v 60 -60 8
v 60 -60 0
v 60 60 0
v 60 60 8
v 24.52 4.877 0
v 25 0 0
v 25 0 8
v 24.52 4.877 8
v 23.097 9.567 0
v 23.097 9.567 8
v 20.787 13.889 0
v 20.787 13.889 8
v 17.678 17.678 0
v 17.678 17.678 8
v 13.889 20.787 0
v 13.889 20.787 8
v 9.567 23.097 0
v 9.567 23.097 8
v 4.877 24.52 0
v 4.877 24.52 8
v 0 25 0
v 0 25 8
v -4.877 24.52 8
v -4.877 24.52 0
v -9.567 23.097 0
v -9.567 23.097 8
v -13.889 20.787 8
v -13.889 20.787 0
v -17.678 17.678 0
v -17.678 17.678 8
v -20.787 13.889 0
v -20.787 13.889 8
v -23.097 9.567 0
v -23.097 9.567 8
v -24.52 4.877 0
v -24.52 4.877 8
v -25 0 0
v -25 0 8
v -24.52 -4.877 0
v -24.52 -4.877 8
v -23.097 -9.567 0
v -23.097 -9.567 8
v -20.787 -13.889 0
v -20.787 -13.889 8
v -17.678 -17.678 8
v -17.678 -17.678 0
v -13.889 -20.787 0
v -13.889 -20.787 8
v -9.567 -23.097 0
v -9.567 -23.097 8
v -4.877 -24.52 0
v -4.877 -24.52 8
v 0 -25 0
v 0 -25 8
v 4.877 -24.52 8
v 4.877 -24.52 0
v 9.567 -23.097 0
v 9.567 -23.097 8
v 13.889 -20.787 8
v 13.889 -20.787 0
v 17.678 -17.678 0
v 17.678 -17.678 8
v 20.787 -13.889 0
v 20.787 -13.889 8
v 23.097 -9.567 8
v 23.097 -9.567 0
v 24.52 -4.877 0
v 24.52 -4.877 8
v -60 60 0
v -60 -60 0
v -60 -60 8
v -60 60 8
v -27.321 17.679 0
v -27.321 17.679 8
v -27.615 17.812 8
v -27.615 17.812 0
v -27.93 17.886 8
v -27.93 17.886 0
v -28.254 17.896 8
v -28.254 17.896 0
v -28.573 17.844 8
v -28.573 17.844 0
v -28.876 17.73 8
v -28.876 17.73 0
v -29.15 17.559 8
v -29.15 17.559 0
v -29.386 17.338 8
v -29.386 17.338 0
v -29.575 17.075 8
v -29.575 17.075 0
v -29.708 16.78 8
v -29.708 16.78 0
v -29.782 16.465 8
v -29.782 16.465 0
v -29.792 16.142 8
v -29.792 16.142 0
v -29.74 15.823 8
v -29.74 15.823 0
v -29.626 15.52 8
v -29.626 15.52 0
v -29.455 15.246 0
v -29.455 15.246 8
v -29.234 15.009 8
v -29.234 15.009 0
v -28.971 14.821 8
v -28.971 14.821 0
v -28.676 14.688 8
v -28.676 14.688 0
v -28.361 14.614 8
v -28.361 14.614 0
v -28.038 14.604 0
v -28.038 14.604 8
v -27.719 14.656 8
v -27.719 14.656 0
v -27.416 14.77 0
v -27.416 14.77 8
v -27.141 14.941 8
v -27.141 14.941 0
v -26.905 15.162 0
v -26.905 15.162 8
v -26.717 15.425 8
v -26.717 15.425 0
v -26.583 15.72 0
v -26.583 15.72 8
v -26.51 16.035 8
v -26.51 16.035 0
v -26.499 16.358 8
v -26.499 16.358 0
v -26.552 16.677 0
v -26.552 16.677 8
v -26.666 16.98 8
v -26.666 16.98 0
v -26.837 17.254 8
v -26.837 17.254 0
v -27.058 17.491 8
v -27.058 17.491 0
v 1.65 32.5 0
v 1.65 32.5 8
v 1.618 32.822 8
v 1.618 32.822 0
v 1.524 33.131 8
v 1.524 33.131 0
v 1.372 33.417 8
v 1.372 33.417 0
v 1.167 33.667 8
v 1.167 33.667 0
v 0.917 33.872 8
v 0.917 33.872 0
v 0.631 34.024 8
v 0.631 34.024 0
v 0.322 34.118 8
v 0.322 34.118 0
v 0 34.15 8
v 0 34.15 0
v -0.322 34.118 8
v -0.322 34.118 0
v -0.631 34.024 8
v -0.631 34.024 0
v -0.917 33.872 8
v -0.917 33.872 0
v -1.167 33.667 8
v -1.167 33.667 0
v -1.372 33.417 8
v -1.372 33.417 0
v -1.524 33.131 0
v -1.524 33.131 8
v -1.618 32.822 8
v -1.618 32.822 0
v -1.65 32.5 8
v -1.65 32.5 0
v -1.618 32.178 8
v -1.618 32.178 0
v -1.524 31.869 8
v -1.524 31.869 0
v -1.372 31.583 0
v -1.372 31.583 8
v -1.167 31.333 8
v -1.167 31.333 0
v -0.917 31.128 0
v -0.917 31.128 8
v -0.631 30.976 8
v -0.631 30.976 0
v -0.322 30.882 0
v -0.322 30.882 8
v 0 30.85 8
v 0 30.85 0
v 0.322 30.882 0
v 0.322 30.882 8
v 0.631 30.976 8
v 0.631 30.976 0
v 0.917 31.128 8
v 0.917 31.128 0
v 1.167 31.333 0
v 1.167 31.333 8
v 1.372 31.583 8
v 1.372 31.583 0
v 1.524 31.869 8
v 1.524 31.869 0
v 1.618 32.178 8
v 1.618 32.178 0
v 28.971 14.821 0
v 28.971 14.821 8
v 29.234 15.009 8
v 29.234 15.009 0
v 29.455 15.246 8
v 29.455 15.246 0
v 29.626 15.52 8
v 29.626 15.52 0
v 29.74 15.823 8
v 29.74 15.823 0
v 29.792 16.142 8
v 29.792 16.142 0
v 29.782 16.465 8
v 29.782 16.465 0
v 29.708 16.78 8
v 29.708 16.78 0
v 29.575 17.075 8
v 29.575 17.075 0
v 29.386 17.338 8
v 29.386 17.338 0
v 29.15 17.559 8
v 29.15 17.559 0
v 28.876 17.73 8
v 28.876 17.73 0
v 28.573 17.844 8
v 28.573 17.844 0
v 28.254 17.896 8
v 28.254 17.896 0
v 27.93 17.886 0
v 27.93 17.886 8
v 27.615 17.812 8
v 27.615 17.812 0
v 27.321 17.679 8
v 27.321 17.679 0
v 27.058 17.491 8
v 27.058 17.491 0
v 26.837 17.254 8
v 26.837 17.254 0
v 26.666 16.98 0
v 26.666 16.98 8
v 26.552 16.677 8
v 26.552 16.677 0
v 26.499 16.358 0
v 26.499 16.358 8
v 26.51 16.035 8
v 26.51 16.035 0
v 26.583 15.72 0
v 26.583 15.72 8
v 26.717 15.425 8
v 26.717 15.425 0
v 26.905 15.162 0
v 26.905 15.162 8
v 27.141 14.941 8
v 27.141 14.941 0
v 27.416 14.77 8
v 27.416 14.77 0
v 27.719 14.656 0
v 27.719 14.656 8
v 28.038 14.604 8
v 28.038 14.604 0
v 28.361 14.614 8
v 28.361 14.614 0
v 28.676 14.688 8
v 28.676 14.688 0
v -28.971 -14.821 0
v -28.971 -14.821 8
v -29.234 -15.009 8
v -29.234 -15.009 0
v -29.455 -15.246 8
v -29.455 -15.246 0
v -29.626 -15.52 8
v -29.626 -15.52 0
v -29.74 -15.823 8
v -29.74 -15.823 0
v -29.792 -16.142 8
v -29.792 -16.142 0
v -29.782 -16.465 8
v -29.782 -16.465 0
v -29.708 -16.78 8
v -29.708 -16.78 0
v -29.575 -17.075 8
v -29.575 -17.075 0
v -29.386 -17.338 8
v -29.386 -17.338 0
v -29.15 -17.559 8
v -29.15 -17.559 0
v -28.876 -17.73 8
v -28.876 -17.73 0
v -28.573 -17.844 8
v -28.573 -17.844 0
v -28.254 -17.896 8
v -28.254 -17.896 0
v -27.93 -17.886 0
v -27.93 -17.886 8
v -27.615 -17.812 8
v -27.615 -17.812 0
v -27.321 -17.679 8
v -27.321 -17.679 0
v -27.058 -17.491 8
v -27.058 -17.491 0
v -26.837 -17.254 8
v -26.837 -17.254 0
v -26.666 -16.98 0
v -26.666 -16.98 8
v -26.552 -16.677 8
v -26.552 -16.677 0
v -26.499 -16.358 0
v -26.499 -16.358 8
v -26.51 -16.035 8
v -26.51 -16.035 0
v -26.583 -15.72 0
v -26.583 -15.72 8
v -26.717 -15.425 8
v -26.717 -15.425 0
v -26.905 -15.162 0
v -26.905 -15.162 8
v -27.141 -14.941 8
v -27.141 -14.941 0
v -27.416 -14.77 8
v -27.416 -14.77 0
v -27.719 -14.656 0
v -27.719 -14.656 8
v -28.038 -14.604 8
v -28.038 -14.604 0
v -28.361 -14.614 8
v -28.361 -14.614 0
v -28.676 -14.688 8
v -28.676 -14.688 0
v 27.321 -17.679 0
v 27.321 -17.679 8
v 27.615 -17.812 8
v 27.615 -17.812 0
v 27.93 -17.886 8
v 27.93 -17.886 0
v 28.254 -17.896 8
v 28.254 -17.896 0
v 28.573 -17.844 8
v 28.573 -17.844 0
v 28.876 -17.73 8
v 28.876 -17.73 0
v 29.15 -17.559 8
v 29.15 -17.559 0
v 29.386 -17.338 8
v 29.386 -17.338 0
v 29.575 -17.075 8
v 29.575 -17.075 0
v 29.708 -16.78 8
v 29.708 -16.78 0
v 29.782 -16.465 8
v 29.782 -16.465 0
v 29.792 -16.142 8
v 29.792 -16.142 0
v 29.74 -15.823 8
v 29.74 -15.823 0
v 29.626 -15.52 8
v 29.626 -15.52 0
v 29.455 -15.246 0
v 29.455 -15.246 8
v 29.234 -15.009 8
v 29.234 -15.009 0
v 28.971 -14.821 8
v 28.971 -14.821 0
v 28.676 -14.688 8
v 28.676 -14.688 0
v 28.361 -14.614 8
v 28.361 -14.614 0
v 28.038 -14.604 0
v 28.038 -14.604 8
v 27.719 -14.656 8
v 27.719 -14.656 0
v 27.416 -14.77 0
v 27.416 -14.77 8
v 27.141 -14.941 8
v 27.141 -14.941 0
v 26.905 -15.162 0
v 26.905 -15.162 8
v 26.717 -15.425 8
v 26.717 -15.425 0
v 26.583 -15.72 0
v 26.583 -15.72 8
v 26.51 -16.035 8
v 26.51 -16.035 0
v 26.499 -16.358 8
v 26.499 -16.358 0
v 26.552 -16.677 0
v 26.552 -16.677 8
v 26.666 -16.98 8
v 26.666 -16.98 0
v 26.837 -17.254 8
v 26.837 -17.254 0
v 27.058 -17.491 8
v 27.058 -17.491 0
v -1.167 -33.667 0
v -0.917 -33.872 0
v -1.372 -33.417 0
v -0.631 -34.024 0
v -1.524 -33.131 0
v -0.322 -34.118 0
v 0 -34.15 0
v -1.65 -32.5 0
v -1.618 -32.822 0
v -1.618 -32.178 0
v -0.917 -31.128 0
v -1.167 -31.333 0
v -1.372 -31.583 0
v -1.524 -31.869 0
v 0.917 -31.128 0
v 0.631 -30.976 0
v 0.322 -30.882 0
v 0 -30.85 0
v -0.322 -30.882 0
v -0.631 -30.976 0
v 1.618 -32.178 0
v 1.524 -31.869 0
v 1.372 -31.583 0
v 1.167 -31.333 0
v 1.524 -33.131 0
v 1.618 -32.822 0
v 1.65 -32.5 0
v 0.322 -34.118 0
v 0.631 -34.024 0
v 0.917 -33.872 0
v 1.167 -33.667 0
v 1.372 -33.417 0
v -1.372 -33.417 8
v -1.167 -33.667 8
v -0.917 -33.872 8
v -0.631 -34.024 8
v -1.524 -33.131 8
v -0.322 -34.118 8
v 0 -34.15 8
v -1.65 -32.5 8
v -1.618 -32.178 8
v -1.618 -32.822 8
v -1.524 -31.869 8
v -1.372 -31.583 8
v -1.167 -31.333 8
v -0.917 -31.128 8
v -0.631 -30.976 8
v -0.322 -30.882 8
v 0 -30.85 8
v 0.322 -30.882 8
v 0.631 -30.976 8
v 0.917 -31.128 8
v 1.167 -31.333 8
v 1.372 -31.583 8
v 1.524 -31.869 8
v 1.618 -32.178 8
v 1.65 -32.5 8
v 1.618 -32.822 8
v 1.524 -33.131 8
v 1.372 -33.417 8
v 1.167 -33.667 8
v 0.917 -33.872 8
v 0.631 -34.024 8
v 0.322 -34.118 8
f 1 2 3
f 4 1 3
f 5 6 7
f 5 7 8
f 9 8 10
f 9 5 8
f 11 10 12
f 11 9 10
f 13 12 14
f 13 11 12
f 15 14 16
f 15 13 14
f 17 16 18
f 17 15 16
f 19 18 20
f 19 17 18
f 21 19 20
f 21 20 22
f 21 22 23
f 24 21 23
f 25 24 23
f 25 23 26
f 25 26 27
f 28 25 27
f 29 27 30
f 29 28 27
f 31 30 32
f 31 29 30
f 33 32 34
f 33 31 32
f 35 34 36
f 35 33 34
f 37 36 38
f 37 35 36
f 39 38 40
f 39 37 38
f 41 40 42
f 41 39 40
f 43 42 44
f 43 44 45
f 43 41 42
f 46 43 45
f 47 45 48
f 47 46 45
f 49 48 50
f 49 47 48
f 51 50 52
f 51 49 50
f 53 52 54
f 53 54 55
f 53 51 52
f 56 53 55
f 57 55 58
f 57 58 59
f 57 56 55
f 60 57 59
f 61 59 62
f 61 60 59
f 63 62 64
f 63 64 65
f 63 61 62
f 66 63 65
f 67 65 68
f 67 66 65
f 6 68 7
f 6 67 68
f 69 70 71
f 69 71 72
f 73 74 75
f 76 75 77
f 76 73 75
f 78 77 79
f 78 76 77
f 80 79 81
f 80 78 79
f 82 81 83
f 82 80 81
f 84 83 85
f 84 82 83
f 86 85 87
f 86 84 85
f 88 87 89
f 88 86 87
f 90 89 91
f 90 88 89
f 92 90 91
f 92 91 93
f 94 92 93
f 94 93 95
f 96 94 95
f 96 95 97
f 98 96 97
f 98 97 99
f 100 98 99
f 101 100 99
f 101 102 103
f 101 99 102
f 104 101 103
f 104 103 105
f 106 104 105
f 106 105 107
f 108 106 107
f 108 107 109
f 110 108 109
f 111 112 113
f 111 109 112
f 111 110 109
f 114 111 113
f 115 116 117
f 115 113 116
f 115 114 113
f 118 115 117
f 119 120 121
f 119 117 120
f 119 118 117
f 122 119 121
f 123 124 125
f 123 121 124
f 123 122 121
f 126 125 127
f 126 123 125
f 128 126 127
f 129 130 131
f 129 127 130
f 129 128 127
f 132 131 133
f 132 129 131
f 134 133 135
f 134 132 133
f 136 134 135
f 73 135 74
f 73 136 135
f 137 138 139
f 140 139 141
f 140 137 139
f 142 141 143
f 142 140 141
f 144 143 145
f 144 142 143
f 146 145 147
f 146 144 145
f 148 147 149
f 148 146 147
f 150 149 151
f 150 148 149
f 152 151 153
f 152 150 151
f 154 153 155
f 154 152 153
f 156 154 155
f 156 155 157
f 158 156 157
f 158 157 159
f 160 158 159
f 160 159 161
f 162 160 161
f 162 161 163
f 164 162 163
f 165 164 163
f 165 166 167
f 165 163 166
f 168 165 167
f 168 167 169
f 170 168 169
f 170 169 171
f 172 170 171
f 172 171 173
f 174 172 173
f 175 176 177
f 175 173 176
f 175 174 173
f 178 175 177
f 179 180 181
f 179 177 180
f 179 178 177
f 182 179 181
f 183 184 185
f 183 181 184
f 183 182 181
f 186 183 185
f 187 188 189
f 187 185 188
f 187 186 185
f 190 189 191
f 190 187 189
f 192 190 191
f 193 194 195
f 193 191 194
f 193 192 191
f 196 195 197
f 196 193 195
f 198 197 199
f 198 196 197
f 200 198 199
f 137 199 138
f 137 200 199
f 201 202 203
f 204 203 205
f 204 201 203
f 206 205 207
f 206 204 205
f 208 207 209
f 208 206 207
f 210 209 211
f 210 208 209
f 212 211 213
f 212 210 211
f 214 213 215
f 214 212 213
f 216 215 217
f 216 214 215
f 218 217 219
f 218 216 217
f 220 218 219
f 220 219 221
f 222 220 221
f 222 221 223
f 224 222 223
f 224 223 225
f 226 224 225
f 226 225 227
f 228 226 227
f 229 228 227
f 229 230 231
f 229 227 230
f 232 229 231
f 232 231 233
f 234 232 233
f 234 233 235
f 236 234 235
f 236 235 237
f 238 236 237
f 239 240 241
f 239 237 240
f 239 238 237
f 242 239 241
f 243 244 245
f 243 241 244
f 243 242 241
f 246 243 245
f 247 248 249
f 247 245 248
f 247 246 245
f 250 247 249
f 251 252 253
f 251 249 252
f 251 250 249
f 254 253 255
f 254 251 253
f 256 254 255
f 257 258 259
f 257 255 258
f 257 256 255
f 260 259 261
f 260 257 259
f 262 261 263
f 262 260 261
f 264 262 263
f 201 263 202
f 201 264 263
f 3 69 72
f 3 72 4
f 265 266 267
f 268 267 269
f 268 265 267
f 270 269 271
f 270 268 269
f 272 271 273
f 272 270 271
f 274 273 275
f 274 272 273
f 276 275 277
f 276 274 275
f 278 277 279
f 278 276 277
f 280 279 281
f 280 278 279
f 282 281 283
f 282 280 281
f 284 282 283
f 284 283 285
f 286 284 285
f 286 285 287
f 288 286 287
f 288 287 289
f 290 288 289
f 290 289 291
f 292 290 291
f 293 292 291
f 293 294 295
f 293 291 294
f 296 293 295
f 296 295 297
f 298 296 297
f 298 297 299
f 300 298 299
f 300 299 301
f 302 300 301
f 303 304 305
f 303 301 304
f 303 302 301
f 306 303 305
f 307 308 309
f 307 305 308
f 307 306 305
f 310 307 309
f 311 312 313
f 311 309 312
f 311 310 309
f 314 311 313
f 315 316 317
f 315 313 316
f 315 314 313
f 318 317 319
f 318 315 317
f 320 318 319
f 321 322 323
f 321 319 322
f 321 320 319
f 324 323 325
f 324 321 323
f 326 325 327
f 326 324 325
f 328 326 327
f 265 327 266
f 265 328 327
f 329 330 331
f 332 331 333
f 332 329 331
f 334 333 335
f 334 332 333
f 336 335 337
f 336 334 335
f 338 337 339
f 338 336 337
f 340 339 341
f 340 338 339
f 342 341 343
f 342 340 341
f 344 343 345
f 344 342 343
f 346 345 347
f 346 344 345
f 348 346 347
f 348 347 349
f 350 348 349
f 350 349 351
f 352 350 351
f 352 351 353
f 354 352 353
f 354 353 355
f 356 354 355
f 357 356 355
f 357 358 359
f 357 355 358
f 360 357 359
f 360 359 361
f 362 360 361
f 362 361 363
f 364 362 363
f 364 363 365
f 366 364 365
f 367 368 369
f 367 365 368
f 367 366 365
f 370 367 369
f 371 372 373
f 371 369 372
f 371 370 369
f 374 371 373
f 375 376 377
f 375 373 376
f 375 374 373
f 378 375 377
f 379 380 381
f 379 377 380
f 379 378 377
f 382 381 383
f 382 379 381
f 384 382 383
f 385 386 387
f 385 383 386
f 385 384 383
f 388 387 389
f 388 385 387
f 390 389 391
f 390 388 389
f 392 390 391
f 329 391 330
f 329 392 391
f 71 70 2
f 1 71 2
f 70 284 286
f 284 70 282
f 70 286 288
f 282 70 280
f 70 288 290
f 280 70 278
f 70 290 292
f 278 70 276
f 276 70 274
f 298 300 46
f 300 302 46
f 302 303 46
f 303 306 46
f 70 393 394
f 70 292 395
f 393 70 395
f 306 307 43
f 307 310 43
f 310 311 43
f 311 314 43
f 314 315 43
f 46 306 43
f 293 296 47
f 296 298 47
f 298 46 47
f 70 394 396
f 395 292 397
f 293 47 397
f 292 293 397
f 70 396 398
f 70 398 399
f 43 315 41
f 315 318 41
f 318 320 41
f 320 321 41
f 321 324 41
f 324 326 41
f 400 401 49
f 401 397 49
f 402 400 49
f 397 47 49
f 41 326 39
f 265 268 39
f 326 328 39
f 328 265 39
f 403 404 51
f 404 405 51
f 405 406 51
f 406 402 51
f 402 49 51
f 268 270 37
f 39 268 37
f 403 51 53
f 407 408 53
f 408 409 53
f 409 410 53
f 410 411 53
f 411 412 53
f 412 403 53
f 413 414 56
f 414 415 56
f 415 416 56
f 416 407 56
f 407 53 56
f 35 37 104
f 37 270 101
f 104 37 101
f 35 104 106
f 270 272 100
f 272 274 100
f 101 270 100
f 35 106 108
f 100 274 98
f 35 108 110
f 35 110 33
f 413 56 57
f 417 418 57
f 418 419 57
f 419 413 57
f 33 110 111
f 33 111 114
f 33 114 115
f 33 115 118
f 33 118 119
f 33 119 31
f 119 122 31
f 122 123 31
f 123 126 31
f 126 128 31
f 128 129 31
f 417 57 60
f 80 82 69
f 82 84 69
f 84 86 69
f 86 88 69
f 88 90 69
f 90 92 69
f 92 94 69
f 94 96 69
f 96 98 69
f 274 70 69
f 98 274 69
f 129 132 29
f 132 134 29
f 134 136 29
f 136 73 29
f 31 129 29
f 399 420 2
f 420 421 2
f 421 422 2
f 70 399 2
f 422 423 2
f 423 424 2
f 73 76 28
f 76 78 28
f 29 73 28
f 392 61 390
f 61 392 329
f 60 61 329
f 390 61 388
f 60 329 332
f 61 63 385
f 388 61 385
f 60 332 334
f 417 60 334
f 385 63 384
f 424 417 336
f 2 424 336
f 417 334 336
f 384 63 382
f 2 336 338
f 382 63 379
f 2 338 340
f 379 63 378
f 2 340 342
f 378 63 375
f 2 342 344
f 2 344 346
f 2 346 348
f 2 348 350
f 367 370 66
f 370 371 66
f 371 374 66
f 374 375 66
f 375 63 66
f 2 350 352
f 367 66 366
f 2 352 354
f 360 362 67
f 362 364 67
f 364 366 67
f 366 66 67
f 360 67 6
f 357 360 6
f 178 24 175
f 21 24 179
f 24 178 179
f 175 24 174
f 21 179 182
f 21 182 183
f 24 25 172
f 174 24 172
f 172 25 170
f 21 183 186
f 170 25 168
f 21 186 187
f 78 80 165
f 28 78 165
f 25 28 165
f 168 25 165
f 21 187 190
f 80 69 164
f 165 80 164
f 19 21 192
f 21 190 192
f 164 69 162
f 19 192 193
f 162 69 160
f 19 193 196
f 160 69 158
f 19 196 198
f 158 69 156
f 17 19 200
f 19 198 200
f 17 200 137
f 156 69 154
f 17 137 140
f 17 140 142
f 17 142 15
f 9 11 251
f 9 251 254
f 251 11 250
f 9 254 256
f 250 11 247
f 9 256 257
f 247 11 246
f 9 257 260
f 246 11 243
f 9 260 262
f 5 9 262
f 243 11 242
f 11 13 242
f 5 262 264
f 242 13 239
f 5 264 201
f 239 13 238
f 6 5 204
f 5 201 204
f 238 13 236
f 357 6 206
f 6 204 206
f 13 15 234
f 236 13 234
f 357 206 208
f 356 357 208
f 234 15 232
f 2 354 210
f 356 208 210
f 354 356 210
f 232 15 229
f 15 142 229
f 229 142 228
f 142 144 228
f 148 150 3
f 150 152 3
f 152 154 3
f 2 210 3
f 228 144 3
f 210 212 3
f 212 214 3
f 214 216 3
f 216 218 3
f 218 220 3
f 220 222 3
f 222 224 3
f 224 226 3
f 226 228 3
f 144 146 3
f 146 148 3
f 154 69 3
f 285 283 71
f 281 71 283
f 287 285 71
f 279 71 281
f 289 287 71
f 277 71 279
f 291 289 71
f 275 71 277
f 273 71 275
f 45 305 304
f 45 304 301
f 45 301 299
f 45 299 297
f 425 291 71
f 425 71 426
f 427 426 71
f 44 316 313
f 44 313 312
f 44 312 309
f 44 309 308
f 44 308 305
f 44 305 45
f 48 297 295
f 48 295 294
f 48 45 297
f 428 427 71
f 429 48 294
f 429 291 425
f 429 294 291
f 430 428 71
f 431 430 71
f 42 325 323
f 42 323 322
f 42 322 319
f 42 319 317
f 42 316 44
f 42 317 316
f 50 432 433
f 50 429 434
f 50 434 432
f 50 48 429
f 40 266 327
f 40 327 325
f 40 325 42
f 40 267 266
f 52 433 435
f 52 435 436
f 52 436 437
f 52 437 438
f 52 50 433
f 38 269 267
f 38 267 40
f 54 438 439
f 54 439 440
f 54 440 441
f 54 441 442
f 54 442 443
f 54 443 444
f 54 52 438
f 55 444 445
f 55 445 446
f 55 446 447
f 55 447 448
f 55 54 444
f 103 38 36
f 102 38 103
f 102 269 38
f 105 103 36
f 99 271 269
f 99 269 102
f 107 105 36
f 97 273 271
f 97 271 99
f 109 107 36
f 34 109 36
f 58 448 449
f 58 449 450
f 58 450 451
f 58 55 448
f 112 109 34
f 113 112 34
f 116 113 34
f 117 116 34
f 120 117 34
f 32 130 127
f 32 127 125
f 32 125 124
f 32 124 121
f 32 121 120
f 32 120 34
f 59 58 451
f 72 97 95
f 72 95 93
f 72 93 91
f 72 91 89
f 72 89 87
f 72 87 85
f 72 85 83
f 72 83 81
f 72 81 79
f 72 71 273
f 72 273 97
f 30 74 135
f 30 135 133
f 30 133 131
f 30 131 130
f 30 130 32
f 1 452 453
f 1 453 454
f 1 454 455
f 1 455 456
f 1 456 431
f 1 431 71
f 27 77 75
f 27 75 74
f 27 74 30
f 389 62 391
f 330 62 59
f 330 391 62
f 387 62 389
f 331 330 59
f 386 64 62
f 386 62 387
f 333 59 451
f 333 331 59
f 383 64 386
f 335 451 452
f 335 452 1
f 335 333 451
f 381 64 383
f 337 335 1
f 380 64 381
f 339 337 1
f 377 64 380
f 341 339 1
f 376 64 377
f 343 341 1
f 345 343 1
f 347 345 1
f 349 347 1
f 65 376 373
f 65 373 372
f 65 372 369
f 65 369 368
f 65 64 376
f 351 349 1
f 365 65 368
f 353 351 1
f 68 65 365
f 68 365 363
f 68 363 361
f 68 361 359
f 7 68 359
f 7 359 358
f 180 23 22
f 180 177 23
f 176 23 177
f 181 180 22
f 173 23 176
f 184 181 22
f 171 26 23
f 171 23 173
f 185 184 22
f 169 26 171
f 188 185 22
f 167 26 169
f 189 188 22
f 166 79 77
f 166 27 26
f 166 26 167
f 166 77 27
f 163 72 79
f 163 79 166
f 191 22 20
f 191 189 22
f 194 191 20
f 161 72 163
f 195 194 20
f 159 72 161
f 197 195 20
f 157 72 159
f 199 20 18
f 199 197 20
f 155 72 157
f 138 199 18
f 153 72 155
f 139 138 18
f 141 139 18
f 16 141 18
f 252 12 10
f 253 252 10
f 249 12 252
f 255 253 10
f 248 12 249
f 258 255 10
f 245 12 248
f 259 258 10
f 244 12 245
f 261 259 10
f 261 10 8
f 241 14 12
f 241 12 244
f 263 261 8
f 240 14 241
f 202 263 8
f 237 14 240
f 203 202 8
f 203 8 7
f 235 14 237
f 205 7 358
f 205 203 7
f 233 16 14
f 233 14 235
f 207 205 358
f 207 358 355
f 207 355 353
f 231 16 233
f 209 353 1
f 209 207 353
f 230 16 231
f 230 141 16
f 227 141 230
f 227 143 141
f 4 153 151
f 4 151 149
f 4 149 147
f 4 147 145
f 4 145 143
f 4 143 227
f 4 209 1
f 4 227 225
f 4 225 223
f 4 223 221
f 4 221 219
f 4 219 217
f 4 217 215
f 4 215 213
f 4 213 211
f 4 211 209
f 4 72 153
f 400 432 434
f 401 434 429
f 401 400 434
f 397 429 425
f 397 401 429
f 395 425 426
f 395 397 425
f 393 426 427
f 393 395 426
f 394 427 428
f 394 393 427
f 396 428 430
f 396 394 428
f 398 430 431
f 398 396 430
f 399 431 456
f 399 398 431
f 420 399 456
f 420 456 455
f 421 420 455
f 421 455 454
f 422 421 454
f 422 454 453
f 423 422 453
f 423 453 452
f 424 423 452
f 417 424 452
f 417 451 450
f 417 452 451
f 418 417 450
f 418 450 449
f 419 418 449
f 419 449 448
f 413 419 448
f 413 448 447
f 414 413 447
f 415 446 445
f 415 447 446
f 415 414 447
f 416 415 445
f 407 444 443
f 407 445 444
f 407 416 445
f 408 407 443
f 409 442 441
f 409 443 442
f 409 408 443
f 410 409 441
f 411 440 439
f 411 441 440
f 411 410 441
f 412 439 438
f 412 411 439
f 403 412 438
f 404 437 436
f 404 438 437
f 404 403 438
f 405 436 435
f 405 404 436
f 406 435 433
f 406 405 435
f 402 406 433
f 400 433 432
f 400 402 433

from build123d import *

# Parameters (mm, degrees)
SKETCH1_W           = 120
SKETCH1_H           = 120
SKETCH1_R           = 25
BOSS_EXTRUDE1_DEPTH = 8
SKETCH2_R           = 1.65
CUT_EXTRUDE2_DEPTH  = 86.229103011
CIRPATTERN1_COUNT   = 6


with BuildPart() as part:
    # Sketch1 → Boss-Extrude1 (new body)
    with BuildSketch(Plane.XY):
        Rectangle(SKETCH1_W, SKETCH1_H)
        Circle(SKETCH1_R, mode=Mode.SUBTRACT)
    extrude(amount=BOSS_EXTRUDE1_DEPTH)

    # Sketch2 → Cut-Extrude2 (cut, through all)
    with BuildSketch(Plane.XY):
        with Locations((0, 32.5)):
            Circle(SKETCH2_R)
    cut_extrude2 = extrude(amount=CUT_EXTRUDE2_DEPTH, mode=Mode.SUBTRACT)

    # CirPattern1: Cut-Extrude2 ×6 about axis
    cirpattern1_axis = Axis((0, 0, 0), (0, 0, 1))
    for i in range(1, CIRPATTERN1_COUNT):
        add(cut_extrude2.rotate(cirpattern1_axis, i * 360 / CIRPATTERN1_COUNT), mode=Mode.SUBTRACT)


solid = part.part
